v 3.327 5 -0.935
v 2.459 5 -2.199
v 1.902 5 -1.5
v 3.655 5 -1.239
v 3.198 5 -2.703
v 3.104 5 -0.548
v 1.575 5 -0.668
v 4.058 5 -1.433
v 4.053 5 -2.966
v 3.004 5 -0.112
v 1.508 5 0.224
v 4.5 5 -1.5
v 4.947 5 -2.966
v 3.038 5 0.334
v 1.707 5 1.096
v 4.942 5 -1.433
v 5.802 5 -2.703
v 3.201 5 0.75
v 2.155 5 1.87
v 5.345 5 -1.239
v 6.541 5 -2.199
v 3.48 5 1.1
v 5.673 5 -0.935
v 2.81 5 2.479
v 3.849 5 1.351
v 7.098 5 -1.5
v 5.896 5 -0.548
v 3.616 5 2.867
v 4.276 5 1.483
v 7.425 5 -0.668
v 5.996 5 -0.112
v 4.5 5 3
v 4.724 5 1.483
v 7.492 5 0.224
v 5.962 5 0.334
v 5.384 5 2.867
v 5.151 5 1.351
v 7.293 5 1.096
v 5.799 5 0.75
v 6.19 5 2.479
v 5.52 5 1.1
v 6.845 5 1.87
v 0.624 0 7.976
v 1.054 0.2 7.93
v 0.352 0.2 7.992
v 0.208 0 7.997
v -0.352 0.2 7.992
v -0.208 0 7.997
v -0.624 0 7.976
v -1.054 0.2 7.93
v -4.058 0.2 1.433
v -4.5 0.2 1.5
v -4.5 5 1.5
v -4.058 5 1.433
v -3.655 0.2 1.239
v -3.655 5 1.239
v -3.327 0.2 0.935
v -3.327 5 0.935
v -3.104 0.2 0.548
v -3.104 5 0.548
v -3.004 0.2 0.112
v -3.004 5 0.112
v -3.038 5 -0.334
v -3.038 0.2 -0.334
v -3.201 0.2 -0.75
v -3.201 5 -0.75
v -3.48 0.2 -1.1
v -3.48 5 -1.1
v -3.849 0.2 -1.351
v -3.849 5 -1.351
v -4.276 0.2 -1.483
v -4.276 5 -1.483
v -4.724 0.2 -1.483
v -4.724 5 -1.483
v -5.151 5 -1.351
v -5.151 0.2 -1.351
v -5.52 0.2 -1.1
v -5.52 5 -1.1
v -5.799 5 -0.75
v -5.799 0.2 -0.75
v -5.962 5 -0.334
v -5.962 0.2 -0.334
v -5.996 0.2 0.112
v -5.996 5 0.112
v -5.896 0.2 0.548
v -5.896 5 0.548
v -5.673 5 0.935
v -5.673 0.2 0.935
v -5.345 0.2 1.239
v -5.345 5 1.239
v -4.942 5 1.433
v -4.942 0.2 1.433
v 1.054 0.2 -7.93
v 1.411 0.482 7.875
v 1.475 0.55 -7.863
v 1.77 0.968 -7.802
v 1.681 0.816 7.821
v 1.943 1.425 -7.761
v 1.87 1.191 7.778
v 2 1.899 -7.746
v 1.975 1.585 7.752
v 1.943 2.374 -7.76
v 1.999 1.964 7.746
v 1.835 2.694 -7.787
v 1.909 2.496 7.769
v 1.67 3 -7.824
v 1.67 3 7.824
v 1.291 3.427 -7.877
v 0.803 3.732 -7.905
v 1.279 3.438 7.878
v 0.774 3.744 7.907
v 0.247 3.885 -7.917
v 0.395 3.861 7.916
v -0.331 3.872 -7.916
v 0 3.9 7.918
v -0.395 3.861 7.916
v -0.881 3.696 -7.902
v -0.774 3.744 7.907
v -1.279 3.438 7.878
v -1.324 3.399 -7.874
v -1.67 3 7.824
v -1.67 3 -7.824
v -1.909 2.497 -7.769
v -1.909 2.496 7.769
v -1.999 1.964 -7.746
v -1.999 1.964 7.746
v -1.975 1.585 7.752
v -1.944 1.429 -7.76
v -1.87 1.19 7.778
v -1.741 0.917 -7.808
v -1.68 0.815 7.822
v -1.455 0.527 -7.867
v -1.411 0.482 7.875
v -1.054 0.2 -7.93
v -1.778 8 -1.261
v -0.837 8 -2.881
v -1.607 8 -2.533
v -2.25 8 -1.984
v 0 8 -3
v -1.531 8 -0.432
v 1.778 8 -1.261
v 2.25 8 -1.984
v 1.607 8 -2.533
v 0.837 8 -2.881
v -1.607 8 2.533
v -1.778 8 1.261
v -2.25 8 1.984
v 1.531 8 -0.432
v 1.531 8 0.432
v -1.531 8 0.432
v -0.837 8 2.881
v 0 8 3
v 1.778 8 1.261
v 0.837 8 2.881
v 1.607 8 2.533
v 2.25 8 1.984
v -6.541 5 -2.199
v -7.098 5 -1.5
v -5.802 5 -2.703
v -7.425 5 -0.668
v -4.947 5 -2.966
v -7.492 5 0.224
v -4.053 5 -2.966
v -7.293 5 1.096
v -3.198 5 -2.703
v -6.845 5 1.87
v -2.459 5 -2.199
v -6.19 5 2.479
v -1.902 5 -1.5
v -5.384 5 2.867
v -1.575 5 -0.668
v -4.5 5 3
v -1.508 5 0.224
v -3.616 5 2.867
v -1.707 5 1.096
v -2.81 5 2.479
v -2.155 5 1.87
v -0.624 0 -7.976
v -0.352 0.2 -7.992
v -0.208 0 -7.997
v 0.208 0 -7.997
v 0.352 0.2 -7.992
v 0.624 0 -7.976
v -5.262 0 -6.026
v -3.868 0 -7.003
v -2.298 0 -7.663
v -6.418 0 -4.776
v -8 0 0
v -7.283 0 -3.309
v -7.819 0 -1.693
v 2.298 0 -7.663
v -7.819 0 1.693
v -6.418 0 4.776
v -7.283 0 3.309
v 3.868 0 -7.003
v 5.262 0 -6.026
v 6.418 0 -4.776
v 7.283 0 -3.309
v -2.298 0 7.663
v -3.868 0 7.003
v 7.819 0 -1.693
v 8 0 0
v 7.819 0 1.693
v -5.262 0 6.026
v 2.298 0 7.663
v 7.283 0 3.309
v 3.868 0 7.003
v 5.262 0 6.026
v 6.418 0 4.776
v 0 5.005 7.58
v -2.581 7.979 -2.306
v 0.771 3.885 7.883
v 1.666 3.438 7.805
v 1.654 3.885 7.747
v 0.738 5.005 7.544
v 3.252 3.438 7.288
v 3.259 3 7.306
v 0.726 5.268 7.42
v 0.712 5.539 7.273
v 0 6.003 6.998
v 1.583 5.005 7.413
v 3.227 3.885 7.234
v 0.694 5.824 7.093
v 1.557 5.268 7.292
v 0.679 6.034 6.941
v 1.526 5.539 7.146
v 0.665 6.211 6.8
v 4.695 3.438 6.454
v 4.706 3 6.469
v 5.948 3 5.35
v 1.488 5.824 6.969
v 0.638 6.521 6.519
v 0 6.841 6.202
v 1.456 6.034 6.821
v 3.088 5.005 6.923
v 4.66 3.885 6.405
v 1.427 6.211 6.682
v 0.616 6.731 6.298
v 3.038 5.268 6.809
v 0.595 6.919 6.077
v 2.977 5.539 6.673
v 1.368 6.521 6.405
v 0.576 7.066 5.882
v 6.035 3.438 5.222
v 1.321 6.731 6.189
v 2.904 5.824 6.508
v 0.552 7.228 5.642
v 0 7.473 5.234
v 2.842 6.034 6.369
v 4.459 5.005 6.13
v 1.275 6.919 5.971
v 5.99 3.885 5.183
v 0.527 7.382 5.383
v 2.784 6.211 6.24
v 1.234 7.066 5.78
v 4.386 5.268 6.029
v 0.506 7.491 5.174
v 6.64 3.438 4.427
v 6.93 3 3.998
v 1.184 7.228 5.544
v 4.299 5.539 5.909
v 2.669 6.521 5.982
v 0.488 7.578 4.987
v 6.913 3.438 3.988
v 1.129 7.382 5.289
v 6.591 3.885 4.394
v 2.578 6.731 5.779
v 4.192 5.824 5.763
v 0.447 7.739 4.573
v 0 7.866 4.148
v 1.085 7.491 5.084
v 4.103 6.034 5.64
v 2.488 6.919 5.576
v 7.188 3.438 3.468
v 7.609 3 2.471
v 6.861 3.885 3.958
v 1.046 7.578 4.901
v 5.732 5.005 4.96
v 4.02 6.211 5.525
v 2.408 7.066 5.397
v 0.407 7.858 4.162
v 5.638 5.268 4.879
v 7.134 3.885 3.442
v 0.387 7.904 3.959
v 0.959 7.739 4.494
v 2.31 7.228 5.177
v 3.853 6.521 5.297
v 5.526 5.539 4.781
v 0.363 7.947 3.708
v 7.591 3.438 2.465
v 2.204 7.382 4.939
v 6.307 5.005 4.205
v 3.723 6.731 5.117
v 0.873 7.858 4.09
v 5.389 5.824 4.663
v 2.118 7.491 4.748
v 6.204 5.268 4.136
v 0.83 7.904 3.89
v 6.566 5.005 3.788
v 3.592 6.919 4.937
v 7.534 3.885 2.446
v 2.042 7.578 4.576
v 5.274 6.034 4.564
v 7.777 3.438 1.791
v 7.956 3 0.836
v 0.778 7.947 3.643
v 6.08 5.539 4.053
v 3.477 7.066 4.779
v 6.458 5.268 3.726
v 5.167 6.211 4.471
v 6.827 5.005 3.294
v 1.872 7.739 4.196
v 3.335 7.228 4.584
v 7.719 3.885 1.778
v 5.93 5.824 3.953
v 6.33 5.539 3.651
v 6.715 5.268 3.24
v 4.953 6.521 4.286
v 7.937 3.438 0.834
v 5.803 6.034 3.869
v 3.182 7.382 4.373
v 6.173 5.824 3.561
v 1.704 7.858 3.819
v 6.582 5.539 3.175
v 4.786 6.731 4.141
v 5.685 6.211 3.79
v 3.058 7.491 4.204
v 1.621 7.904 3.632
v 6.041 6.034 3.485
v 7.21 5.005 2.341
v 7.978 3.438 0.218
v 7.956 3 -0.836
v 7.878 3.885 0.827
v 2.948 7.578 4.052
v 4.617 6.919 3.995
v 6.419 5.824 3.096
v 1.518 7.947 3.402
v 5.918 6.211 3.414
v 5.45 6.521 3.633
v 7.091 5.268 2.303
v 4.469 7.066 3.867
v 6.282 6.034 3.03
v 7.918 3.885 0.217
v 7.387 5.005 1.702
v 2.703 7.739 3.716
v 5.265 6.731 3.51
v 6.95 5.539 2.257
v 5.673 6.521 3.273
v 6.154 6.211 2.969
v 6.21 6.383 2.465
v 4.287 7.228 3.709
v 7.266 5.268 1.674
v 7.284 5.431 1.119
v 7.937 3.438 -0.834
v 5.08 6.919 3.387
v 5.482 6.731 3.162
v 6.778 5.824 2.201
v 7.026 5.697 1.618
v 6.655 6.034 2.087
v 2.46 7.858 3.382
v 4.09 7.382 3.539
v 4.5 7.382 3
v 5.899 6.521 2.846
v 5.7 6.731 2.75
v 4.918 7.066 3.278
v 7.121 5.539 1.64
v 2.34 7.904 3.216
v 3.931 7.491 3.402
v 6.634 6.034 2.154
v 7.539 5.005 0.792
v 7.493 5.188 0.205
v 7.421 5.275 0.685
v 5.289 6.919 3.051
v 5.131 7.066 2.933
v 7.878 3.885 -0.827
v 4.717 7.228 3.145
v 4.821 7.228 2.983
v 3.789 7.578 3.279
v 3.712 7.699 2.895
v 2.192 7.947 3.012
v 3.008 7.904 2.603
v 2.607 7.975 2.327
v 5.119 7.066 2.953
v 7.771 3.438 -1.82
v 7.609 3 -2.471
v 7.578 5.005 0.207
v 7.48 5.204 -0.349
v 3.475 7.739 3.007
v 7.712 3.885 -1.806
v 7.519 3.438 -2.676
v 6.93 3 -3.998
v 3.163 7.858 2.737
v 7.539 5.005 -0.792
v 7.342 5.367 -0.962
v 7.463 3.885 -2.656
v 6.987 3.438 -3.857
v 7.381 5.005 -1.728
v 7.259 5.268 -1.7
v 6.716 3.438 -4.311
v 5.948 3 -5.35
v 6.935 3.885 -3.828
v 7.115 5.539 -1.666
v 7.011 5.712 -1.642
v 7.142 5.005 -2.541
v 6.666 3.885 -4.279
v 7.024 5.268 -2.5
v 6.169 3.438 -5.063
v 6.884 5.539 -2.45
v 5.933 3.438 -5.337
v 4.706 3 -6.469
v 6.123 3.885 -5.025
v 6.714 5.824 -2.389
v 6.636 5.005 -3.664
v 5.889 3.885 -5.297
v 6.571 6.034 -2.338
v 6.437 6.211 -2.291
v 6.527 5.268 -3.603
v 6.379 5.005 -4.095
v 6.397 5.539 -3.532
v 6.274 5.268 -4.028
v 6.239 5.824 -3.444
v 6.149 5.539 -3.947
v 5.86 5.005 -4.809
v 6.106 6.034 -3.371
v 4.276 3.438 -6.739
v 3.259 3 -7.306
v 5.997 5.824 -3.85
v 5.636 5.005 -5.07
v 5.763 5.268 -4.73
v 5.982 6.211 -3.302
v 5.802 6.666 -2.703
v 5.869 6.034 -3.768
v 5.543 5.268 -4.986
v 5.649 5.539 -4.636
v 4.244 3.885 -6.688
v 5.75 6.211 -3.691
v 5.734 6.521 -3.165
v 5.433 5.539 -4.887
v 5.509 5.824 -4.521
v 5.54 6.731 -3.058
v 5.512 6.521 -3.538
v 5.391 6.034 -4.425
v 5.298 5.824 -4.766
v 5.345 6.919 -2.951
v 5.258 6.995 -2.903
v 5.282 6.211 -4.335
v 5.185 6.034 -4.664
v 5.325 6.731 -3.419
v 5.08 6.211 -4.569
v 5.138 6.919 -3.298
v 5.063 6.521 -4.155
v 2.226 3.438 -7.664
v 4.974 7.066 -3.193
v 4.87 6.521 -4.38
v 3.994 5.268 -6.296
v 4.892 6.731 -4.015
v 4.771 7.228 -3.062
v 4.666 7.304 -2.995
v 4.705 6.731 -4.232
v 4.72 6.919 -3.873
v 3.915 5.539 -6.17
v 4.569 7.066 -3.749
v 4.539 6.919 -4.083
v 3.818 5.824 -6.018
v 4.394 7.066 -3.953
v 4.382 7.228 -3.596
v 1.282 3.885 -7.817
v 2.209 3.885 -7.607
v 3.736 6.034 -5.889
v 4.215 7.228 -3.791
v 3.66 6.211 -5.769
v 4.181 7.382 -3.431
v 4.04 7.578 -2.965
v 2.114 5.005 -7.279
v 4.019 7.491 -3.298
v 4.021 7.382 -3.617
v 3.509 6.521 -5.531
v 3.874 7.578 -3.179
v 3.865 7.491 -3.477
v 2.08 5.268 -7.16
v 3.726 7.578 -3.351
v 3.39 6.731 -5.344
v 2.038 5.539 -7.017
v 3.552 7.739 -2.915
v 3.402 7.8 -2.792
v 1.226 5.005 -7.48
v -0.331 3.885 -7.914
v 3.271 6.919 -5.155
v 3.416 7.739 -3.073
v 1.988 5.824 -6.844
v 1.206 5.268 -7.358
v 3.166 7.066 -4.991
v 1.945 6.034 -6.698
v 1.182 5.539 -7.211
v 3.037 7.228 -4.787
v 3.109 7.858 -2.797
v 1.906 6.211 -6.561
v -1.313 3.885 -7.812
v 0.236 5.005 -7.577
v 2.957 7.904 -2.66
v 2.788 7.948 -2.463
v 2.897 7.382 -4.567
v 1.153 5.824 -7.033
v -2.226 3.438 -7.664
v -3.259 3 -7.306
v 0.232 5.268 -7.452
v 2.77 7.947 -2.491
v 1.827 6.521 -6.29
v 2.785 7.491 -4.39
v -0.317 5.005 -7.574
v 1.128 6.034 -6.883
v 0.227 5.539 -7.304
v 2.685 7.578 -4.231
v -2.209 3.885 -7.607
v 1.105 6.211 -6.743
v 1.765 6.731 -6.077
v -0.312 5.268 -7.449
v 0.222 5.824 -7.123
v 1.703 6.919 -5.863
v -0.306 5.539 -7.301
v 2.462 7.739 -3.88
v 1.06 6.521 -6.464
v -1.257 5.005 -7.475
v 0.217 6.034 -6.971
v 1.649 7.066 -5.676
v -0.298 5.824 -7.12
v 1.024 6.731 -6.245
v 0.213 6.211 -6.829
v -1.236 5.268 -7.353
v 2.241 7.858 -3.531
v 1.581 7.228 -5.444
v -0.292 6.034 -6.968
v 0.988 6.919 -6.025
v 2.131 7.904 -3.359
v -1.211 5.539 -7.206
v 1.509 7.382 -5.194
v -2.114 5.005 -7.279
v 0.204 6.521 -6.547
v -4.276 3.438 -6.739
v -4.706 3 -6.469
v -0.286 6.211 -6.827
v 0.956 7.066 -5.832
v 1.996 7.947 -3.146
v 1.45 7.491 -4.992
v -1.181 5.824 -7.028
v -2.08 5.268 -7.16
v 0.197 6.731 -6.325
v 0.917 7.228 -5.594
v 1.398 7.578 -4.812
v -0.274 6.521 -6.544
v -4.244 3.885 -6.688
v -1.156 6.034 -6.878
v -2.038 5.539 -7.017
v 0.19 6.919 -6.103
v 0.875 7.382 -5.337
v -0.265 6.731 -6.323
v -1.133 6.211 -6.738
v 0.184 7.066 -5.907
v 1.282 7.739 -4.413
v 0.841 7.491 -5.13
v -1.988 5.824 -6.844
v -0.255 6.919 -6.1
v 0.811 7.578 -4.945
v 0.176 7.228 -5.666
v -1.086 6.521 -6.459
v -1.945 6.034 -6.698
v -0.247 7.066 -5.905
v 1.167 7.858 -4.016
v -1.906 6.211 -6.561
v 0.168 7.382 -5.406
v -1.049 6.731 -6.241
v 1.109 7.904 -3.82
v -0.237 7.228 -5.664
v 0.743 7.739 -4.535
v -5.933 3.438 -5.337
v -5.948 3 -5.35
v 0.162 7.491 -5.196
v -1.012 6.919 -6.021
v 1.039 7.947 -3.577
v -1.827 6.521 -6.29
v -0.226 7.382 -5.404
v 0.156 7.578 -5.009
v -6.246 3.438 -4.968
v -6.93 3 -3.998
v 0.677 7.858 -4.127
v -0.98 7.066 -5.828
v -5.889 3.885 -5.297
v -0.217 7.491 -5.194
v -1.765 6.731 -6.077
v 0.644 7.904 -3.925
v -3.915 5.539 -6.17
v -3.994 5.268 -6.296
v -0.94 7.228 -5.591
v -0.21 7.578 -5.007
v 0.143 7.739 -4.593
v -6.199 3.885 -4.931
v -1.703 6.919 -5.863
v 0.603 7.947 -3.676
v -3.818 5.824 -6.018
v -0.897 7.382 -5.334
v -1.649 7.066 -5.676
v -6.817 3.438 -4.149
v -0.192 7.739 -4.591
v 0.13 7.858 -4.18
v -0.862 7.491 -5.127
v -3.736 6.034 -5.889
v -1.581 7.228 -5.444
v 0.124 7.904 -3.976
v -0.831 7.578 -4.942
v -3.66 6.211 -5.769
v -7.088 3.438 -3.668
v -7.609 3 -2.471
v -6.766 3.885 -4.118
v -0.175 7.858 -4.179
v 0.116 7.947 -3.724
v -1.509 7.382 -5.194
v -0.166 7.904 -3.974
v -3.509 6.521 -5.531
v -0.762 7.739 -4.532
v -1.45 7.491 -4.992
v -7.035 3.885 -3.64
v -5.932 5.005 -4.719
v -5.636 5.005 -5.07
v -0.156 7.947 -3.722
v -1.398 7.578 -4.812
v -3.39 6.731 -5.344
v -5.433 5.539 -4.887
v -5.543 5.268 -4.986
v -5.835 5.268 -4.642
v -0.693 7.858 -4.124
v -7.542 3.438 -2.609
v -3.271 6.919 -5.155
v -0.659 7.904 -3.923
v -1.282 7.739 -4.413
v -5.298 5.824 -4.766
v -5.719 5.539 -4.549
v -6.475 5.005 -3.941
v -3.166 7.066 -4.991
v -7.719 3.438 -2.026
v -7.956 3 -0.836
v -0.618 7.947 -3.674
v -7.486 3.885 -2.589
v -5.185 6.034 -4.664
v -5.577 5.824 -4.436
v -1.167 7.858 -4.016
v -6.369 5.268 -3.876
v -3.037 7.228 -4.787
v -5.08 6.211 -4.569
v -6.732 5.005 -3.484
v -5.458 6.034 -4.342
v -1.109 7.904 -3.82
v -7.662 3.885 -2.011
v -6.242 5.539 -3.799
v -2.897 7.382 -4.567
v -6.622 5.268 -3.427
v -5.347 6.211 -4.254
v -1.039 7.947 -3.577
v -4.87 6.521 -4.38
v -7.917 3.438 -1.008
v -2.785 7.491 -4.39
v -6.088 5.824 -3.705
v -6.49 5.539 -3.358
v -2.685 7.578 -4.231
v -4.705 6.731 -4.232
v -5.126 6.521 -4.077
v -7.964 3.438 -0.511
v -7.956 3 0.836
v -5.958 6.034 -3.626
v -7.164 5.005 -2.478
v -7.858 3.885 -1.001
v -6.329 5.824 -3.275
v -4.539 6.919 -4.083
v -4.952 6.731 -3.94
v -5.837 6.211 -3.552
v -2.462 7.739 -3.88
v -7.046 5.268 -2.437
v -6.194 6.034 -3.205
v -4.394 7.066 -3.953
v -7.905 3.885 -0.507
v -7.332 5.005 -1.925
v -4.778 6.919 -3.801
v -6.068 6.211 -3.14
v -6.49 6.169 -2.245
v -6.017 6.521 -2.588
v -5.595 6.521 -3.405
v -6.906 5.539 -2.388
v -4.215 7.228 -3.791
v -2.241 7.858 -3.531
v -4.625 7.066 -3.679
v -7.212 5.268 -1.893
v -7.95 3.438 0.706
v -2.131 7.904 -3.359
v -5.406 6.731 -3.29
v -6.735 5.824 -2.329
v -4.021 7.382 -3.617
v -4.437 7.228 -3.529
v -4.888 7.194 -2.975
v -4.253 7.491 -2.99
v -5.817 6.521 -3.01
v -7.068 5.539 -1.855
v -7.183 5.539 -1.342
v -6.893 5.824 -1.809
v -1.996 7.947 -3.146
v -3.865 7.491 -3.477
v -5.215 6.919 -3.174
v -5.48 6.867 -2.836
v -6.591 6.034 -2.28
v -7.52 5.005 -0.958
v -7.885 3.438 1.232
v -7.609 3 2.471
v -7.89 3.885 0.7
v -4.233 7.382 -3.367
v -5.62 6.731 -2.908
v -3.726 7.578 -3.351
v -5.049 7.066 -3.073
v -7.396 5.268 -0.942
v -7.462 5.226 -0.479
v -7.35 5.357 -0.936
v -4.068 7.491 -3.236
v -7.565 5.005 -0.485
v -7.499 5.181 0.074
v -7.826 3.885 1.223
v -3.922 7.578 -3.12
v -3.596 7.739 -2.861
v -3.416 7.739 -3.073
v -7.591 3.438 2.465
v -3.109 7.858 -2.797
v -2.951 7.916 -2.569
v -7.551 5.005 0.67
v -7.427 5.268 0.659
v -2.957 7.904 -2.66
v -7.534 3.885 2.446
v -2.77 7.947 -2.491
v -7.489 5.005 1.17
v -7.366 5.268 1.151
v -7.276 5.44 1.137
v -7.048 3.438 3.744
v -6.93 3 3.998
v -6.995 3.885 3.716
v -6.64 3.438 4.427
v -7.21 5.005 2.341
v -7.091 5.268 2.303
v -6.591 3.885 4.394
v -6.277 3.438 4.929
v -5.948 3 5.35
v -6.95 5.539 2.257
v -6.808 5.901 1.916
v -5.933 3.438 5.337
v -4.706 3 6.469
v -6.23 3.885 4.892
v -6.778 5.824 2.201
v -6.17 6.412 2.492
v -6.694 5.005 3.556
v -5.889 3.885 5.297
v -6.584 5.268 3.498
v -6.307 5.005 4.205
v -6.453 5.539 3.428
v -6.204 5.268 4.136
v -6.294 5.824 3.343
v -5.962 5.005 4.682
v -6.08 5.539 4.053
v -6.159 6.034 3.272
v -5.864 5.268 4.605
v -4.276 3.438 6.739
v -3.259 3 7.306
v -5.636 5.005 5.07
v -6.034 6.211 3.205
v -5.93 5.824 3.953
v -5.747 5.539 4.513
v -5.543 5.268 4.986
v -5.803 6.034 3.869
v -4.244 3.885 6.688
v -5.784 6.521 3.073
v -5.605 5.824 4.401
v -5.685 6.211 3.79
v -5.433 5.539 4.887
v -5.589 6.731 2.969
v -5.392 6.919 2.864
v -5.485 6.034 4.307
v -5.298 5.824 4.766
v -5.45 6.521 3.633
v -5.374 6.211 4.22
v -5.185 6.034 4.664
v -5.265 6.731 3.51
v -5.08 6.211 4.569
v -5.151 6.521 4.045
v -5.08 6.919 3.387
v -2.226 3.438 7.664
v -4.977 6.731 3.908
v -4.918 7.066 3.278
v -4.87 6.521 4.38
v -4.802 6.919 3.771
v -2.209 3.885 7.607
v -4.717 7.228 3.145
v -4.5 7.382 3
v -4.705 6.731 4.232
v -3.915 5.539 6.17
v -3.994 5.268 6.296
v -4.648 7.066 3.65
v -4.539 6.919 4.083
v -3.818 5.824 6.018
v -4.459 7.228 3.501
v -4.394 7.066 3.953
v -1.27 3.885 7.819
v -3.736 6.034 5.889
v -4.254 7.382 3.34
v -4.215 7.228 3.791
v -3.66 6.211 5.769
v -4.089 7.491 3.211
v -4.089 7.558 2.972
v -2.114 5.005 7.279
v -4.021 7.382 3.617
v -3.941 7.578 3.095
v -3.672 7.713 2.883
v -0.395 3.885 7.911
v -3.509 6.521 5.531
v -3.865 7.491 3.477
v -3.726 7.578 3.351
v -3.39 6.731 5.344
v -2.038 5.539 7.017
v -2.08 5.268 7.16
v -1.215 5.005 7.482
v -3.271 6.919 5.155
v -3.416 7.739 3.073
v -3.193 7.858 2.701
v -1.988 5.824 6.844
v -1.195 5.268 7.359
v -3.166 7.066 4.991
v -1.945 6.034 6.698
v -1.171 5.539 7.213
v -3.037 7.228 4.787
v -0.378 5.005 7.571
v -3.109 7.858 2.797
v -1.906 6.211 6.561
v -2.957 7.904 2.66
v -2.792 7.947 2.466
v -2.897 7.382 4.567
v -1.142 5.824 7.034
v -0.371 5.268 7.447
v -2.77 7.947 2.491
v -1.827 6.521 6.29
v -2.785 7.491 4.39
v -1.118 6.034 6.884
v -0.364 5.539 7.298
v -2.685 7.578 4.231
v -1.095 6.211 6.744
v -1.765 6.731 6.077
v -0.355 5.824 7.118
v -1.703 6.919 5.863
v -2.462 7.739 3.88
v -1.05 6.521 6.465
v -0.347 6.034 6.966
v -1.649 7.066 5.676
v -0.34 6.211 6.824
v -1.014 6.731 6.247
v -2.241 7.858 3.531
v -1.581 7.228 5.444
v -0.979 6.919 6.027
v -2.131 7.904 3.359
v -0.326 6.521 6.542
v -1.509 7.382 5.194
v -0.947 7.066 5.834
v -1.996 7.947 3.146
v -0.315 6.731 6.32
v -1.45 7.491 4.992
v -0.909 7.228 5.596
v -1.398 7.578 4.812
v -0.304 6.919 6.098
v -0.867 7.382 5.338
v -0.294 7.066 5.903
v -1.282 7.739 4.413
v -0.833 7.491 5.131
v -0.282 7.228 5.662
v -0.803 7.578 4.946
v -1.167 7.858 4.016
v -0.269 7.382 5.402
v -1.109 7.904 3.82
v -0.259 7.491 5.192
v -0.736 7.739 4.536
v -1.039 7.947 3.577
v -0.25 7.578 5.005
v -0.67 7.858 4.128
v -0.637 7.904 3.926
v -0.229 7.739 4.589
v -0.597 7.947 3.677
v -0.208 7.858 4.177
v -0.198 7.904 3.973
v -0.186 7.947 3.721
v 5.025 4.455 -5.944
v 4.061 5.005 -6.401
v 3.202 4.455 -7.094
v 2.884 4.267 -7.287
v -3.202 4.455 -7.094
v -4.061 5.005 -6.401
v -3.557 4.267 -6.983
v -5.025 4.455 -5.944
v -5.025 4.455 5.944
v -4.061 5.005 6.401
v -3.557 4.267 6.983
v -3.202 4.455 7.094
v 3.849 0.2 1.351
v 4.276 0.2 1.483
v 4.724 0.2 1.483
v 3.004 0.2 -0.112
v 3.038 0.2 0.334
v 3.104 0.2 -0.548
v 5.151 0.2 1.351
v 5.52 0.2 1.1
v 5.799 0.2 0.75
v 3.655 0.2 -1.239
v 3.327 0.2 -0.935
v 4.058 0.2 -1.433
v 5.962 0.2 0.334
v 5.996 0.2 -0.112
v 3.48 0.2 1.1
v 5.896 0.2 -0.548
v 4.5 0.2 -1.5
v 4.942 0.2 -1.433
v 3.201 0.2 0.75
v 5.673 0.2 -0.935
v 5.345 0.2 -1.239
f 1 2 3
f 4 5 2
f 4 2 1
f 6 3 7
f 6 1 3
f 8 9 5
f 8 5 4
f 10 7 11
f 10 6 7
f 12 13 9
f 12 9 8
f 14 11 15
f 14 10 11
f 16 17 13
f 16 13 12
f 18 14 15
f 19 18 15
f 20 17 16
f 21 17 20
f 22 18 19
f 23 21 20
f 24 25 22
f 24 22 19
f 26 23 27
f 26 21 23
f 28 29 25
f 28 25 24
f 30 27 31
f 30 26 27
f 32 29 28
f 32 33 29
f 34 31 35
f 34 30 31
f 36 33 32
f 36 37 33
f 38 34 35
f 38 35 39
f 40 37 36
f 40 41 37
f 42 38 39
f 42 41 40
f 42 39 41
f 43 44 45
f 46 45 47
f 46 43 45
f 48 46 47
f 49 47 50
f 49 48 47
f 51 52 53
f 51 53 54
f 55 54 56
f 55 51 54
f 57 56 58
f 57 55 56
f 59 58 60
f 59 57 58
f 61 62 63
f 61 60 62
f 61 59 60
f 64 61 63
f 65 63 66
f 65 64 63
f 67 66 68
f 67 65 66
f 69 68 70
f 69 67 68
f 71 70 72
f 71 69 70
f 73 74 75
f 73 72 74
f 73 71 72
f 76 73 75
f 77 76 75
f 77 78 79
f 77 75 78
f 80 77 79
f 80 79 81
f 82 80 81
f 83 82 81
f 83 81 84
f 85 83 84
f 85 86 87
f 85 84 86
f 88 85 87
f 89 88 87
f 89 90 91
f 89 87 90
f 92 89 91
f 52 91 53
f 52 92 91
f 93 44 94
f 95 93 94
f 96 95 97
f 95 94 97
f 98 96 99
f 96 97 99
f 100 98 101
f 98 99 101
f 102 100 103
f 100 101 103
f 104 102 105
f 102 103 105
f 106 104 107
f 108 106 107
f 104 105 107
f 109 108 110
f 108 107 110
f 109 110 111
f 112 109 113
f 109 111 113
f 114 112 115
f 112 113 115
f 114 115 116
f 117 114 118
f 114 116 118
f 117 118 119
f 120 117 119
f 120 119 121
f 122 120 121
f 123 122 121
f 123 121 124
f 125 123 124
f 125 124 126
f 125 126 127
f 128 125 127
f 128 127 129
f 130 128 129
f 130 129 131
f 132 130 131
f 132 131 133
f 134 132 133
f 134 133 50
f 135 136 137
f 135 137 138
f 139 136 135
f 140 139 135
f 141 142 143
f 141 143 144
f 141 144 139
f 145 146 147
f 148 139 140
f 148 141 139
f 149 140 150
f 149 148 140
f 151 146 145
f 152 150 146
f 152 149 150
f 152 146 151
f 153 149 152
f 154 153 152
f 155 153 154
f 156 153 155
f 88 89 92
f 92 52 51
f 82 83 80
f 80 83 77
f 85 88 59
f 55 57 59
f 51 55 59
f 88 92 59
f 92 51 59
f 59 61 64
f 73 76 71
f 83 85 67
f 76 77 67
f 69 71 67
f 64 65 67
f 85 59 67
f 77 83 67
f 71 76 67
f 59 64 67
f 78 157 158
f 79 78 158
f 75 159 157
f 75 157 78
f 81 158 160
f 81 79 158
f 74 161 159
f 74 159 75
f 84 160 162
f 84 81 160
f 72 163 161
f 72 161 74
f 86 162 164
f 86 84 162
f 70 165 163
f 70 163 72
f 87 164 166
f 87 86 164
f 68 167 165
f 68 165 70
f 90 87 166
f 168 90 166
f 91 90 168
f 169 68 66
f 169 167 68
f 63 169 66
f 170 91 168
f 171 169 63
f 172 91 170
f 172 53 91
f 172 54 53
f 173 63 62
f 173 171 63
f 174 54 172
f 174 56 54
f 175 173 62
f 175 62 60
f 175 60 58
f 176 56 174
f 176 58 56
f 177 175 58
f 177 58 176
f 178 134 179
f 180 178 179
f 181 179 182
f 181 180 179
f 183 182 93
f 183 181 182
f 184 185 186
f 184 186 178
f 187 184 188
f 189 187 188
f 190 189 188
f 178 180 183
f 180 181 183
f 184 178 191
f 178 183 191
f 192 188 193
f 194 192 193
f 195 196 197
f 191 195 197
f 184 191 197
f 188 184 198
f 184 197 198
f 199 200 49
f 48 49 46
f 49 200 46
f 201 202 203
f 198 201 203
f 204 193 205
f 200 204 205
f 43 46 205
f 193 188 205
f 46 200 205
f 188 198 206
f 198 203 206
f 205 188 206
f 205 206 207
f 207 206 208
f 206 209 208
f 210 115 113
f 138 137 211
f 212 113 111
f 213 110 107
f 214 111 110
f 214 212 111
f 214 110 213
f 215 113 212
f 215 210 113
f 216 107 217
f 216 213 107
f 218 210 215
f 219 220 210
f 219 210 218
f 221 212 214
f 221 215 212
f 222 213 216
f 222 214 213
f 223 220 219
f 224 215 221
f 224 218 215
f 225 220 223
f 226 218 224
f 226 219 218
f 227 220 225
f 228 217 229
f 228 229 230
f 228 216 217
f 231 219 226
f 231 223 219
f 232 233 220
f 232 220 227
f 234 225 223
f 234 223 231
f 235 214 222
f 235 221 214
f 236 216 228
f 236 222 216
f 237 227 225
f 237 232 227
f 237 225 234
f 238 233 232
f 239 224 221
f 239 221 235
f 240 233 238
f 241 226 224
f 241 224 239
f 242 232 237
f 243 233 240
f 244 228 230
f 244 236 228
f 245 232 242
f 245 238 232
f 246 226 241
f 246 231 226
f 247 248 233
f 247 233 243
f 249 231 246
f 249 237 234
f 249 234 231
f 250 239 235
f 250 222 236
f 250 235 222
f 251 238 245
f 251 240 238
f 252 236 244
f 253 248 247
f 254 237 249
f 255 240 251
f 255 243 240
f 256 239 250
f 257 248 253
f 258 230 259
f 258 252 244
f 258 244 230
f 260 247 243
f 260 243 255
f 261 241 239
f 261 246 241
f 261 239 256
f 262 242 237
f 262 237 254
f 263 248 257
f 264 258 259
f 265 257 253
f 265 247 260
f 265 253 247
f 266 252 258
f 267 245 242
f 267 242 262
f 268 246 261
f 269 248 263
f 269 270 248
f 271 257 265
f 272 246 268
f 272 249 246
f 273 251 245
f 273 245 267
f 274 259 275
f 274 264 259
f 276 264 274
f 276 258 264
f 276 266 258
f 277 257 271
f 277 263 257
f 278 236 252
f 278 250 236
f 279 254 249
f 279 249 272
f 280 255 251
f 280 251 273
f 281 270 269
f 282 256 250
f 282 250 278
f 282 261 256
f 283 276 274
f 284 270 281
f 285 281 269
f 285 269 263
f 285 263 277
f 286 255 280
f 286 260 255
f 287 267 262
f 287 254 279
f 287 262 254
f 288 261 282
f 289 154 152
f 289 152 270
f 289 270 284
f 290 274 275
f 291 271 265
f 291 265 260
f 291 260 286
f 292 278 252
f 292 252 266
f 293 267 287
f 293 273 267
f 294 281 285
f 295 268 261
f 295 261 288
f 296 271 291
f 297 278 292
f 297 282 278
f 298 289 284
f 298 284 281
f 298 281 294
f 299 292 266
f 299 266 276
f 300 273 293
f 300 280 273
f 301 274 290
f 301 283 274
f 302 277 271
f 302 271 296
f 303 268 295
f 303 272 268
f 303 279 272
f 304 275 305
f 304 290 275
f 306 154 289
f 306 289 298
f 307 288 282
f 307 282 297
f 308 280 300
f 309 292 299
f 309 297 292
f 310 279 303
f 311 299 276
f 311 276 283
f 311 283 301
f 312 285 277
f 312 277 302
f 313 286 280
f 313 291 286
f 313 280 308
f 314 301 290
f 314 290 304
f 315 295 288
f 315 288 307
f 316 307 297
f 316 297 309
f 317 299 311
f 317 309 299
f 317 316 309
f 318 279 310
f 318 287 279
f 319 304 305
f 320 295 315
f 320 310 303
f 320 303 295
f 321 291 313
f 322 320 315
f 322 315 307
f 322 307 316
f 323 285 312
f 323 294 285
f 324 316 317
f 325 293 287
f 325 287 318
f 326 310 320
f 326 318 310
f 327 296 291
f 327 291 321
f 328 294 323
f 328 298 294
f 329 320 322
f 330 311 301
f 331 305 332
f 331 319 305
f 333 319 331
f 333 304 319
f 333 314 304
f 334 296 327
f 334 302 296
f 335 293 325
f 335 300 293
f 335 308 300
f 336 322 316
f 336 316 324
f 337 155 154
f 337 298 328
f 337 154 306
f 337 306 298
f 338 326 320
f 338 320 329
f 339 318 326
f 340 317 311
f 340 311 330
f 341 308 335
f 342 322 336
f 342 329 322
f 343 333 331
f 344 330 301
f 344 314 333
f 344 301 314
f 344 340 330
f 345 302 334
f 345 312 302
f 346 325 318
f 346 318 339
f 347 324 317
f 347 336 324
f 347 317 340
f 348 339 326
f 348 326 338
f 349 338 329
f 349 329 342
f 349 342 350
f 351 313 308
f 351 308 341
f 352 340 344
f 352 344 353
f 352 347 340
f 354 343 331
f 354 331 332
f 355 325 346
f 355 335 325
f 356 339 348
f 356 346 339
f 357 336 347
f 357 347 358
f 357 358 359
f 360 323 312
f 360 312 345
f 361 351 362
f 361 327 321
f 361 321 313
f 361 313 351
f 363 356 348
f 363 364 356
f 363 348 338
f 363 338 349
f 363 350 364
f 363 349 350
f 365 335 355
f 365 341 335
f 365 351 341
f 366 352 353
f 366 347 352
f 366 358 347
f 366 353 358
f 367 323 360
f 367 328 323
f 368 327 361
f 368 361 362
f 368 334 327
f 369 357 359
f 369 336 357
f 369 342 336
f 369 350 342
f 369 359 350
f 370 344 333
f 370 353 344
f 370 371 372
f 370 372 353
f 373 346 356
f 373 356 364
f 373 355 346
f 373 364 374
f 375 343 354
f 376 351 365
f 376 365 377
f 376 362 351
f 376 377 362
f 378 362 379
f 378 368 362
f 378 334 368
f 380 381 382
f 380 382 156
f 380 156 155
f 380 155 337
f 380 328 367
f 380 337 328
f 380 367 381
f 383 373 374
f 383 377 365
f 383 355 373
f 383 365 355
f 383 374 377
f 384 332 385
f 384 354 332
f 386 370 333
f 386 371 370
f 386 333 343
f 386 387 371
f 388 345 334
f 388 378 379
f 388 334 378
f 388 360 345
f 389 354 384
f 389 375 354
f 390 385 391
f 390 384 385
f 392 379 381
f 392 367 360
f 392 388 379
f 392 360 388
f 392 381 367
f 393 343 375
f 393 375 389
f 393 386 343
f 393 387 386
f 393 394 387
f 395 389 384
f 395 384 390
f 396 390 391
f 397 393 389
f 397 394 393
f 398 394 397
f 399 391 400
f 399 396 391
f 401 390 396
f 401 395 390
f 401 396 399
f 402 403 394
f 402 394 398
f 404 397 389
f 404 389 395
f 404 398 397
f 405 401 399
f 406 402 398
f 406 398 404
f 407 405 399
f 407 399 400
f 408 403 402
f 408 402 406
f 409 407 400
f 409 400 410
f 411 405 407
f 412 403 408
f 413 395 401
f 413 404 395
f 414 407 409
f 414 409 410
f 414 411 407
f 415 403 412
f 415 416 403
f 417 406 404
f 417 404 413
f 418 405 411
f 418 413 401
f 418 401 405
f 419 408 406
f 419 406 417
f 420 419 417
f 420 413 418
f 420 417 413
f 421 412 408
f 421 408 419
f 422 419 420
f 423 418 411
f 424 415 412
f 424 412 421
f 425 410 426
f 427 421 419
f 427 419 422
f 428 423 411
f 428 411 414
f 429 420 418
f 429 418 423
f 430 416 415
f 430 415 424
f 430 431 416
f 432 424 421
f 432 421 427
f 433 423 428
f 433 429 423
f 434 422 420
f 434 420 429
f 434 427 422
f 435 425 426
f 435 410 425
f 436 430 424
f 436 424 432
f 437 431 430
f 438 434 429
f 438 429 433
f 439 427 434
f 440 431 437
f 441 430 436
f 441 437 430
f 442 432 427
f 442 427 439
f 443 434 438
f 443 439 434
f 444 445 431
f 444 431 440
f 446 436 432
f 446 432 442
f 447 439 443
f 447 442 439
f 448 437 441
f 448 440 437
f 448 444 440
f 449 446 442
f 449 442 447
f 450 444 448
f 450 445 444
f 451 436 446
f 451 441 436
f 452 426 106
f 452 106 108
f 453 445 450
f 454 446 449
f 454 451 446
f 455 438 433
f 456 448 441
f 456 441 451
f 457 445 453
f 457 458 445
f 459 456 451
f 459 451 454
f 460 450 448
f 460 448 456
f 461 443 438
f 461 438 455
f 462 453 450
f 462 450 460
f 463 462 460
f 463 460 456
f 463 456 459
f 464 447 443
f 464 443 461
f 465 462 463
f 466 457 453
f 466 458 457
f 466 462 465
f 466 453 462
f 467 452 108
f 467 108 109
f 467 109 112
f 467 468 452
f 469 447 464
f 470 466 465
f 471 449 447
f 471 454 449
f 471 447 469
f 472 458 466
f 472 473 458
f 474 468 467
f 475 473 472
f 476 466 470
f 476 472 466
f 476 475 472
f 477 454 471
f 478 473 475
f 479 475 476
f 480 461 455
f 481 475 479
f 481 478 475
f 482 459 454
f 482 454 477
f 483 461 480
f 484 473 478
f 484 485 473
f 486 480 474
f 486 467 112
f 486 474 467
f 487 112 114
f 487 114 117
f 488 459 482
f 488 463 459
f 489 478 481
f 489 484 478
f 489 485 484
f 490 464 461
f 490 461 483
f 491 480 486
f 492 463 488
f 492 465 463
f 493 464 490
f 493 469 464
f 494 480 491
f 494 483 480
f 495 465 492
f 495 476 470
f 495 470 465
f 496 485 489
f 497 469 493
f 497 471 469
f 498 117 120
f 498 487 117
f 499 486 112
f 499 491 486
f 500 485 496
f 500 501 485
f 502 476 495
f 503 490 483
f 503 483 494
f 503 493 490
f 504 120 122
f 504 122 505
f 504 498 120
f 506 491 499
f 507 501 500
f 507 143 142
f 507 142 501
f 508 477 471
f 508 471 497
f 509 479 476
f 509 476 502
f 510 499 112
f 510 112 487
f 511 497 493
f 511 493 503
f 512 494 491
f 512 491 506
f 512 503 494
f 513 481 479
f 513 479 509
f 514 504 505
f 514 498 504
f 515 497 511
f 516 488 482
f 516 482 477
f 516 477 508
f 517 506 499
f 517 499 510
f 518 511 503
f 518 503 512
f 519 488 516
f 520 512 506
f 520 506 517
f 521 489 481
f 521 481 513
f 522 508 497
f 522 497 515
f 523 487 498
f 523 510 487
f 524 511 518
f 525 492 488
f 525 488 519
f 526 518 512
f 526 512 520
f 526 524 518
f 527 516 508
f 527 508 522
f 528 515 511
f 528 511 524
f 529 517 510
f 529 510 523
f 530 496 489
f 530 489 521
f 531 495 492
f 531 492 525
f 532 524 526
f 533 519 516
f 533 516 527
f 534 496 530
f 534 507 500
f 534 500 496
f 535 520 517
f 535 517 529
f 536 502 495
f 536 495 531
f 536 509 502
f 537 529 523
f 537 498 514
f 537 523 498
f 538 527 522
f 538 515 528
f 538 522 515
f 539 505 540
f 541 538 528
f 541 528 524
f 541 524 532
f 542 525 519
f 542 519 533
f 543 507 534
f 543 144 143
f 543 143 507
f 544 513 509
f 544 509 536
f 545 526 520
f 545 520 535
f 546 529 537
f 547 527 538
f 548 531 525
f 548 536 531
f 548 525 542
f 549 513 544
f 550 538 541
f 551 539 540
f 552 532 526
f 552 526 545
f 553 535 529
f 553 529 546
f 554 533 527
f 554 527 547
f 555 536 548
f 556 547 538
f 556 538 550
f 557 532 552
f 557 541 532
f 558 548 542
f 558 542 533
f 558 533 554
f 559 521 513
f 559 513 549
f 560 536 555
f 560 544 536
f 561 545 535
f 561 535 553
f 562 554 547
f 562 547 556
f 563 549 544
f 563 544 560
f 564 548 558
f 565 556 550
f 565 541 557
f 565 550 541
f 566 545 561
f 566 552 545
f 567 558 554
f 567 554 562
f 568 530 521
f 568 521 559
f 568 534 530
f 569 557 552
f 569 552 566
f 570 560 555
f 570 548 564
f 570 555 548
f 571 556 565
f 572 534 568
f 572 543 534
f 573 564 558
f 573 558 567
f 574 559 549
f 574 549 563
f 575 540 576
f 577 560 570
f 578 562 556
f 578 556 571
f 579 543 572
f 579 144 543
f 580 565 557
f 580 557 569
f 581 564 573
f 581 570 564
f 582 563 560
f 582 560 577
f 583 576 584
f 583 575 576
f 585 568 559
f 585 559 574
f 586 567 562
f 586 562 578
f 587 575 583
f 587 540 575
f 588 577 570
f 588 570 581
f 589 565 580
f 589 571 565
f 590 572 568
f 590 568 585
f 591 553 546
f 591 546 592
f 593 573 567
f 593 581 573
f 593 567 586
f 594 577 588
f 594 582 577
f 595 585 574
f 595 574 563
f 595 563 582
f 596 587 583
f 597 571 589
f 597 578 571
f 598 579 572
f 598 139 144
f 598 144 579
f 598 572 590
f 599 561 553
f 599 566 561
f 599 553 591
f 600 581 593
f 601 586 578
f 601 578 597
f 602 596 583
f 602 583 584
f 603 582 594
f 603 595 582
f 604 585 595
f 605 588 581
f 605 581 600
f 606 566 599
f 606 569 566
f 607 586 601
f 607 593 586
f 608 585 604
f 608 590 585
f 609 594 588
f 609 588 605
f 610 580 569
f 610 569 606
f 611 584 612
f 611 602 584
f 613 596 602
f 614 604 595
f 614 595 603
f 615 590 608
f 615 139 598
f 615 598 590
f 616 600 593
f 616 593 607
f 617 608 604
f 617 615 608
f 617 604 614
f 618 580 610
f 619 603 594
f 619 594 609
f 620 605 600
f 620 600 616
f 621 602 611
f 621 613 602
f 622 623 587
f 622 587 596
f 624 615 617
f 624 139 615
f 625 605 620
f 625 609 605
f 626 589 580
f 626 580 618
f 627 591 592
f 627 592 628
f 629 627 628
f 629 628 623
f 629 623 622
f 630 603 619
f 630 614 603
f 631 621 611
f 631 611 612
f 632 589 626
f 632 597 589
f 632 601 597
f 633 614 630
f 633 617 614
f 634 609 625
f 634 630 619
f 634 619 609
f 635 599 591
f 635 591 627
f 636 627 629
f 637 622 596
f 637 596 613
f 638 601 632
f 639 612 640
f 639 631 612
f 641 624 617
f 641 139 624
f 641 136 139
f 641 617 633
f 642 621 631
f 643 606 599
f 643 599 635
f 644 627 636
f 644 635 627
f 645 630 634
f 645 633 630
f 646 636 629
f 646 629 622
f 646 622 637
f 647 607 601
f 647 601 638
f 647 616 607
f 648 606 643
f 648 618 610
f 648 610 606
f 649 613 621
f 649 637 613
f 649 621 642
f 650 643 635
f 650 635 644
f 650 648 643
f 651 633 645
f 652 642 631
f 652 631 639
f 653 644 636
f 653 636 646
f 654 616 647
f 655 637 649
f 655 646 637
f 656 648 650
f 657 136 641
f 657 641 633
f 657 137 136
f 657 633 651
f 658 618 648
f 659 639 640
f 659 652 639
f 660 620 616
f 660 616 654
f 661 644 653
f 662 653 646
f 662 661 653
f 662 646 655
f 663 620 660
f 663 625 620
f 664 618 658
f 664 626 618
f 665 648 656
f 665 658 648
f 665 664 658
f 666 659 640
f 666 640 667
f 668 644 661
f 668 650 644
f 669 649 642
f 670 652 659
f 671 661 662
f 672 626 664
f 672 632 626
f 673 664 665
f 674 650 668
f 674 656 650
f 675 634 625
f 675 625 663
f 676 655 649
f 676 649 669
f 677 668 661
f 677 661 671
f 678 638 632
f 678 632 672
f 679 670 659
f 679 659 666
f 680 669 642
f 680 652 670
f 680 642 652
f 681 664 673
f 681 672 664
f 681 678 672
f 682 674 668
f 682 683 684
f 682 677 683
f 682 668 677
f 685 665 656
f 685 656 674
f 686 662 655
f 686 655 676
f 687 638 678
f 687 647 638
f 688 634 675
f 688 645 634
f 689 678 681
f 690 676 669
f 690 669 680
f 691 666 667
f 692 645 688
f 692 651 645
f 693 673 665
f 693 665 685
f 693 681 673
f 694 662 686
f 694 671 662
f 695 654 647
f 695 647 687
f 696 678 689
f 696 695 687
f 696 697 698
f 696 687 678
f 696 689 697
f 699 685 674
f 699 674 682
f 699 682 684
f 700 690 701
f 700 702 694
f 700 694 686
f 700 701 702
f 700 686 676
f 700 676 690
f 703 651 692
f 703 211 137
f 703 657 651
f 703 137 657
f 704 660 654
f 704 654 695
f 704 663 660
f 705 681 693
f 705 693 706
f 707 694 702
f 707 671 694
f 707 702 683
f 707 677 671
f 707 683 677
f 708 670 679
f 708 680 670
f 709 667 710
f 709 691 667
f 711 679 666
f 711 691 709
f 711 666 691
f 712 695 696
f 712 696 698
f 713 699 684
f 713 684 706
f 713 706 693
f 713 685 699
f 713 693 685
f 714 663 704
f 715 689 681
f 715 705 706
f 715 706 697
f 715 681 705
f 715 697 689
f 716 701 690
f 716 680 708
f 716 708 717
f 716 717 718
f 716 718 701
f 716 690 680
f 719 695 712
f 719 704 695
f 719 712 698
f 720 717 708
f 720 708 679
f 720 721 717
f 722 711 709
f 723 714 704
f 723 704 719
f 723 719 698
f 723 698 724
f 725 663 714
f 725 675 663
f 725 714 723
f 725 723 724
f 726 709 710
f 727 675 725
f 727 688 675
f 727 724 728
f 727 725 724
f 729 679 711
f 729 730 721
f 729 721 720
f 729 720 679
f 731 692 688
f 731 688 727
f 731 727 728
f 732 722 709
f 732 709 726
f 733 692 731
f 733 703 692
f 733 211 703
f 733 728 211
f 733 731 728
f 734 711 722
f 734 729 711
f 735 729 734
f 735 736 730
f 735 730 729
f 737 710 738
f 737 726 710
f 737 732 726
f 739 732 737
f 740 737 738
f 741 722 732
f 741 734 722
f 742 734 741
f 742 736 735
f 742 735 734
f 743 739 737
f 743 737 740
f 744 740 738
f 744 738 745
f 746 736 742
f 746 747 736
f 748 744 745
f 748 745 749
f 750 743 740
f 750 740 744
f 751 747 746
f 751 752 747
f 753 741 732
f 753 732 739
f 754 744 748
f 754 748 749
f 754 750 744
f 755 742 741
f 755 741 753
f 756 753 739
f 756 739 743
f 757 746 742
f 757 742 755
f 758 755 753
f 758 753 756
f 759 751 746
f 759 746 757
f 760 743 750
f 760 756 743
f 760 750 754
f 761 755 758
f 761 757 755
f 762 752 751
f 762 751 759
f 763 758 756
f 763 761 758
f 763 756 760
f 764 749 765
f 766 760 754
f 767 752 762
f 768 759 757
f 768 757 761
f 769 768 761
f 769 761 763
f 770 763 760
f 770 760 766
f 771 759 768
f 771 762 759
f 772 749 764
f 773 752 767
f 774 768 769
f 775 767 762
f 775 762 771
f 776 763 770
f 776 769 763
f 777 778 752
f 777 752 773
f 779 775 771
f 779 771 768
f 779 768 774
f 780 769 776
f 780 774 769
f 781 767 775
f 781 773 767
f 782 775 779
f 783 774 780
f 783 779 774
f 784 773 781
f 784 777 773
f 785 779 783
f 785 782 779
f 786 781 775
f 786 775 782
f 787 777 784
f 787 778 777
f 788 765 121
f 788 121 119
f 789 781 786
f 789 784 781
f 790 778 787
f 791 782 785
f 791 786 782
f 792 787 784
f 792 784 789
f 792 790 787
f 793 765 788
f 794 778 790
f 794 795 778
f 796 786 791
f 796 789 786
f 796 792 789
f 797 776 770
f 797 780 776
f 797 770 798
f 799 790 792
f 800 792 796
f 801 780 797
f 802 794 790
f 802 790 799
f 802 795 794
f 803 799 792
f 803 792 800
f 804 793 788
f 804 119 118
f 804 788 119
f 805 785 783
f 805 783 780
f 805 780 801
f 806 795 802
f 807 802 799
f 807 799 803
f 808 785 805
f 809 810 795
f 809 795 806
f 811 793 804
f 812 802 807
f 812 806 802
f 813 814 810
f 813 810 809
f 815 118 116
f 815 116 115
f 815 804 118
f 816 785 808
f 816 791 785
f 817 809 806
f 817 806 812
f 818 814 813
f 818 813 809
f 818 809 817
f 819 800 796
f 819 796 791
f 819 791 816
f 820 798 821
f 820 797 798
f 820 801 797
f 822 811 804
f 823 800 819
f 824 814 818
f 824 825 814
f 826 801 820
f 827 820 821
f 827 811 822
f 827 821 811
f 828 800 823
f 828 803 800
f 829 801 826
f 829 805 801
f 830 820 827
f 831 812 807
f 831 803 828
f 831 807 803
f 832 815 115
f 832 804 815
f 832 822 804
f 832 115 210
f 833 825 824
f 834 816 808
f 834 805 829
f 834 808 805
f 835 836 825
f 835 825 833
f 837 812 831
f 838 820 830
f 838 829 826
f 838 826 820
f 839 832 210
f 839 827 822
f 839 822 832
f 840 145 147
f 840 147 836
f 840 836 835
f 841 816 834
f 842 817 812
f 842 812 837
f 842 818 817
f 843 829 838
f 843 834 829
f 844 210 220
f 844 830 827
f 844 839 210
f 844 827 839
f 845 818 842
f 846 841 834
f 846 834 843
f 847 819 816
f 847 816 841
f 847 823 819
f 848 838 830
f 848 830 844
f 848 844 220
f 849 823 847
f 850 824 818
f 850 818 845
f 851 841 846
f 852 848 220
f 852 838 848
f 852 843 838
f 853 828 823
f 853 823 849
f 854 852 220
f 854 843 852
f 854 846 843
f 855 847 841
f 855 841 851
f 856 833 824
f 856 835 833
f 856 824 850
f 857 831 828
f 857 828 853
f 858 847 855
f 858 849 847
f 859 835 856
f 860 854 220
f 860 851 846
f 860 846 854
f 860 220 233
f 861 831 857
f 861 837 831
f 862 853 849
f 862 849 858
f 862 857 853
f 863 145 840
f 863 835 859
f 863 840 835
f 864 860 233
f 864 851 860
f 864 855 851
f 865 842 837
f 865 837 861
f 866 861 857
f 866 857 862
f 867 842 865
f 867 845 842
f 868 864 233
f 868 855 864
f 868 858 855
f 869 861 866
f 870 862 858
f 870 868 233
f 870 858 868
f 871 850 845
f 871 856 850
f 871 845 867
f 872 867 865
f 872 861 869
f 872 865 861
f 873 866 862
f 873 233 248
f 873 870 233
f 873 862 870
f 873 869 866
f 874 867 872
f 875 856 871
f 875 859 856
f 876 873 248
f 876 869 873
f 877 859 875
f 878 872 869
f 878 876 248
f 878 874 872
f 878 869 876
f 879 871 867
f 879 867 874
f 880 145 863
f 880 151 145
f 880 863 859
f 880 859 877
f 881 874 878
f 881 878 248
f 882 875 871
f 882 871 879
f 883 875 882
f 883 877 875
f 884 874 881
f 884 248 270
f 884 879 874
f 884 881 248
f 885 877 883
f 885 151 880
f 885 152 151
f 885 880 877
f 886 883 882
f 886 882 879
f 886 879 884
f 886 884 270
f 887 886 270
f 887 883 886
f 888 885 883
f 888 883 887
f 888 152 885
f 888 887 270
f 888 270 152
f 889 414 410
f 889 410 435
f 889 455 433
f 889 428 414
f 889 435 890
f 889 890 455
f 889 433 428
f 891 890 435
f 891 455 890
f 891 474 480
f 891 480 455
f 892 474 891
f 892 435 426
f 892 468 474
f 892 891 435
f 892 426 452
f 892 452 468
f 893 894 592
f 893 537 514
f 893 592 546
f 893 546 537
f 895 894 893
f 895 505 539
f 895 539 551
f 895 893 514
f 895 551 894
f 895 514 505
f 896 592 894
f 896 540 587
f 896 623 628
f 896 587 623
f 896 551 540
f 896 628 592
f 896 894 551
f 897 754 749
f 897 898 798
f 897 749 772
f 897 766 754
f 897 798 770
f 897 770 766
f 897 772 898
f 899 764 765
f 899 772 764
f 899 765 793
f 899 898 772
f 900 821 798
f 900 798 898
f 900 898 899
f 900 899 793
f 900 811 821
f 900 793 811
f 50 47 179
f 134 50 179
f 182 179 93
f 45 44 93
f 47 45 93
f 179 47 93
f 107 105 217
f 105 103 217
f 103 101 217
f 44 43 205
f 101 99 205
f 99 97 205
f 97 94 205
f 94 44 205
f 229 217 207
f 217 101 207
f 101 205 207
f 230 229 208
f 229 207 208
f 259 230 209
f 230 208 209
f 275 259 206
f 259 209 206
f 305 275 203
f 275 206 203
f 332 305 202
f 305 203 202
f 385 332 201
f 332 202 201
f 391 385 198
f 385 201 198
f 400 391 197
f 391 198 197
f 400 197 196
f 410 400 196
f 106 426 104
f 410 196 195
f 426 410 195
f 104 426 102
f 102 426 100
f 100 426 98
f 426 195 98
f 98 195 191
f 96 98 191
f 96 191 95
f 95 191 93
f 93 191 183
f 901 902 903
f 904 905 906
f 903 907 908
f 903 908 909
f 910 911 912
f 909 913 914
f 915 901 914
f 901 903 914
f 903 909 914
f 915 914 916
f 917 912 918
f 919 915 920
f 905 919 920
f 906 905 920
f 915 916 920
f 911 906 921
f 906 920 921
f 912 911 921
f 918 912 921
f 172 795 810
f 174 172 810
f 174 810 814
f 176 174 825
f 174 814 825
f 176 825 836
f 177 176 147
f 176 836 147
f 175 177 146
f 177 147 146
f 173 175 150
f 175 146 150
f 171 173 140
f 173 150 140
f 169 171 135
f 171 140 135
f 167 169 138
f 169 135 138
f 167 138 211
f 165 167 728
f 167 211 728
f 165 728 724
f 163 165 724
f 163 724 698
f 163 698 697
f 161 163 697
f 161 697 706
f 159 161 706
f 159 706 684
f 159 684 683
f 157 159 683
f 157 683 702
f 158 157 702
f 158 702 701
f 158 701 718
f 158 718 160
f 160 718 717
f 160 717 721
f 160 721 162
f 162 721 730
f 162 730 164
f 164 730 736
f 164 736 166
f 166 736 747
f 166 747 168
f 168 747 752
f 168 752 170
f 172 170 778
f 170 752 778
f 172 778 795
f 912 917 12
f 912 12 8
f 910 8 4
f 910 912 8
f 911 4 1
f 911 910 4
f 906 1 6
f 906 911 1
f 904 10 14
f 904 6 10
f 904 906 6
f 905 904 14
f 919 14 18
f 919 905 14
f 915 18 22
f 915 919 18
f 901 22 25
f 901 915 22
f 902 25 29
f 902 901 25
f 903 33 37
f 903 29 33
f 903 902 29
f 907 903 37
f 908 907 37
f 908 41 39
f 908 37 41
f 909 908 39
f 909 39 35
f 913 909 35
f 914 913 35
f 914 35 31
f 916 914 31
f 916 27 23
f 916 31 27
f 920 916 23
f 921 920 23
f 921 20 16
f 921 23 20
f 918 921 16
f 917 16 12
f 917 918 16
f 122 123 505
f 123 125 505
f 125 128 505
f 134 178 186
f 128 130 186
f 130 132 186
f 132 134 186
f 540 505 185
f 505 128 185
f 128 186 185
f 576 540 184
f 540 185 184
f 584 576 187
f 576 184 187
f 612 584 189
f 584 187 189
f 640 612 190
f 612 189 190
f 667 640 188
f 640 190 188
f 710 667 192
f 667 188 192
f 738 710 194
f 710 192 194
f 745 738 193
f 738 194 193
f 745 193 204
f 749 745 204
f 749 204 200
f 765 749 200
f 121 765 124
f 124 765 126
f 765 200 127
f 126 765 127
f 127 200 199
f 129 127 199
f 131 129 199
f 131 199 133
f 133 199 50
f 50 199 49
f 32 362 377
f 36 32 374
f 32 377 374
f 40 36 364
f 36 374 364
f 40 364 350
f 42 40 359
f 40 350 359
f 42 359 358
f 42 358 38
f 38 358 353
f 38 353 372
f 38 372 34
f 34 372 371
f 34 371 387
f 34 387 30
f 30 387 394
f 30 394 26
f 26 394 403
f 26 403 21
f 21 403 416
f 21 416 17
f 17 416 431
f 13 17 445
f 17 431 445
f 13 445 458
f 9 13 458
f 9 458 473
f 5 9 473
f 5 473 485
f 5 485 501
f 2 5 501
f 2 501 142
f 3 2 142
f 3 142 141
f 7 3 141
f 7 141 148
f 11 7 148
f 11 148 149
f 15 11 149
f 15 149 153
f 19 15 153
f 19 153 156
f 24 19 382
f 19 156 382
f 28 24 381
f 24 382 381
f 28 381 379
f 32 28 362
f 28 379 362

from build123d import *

# Parameters (mm, degrees)
ESQUISSE1_R             = 8
ESQUISSE1_R_2           = 1.5
BOSS_EXTRU_1_DEPTH      = 8
ESQUISSE2_R             = 3
ENL_V_MAT_EXTRU_1_DEPTH = 3
ESQUISSE3_R             = 2
ENL_V_MAT_EXTRU_2_DEPTH = 20
CONG_1_R                = 5
ESQUISSE4_R             = 8
BOSS_EXTRU_2_DEPTH      = 0.2


with BuildPart() as part:
    # Esquisse1 → Boss.-Extru.1 (new body)
    with BuildSketch(Plane(origin=(0, 0, 0), x_dir=(1, 0, 0), z_dir=(0, 1, 0))):
        with Locations(Location((0, 0, 0), (0, 0, 270))):
            Circle(ESQUISSE1_R)
        with Locations(Location((-4.5, 0, 0), (0, 0, 270))):
            Circle(ESQUISSE1_R_2, mode=Mode.SUBTRACT)
        with Locations(Location((4.5, 0, 0), (0, 0, 90))):
            Circle(ESQUISSE1_R_2, mode=Mode.SUBTRACT)
    extrude(amount=BOSS_EXTRU_1_DEPTH)

    # Esquisse2 → Enlèv. mat.-Extru.1 (cut)
    with BuildSketch(Plane(origin=(0, 8, 0), x_dir=(1, 0, 0), z_dir=(0, 1, 0))):
        with Locations(Location((-4.5, 0, 0), (0, 0, 270))):
            Circle(ESQUISSE2_R)
        with Locations(Location((4.5, 0, 0), (0, 0, 270))):
            Circle(ESQUISSE2_R)
    extrude(amount=-ENL_V_MAT_EXTRU_1_DEPTH, mode=Mode.SUBTRACT)

    # Esquisse3 → Enlèv. mat.-Extru.2 (cut, symmetric)
    with BuildSketch(Plane.XY):
        with Locations((0, 1.9)):
            Circle(ESQUISSE3_R)
    extrude(amount=ENL_V_MAT_EXTRU_2_DEPTH, both=True, mode=Mode.SUBTRACT)

    # Congé1
    # the kernel refuses this fillet: 5 mm, written as the material it takes off along each edge
    with BuildSketch(Plane(origin=(0, 8, 0), x_dir=(0, 0, 1), z_dir=(-1, 0, 0))) as cong_1_piece_1:
        with BuildLine():
            CenterArc((8 - CONG_1_R, -CONG_1_R), CONG_1_R, 0, 90)
            Line((8 - CONG_1_R, 0), (8, 0))
            Line((8, 0), (8, -CONG_1_R))
        make_face()
    revolve(axis=Axis((0, 8, 0), (0, 1, 0)), mode=Mode.SUBTRACT)

    # Esquisse4 → Boss.-Extru.2 (add)
    with BuildSketch(Plane.XZ):
        with Locations(Location((0, 0, 0), (0, 0, 262.432428308))):
            Circle(ESQUISSE4_R)
    extrude(amount=-BOSS_EXTRU_2_DEPTH)


solid = part.part
